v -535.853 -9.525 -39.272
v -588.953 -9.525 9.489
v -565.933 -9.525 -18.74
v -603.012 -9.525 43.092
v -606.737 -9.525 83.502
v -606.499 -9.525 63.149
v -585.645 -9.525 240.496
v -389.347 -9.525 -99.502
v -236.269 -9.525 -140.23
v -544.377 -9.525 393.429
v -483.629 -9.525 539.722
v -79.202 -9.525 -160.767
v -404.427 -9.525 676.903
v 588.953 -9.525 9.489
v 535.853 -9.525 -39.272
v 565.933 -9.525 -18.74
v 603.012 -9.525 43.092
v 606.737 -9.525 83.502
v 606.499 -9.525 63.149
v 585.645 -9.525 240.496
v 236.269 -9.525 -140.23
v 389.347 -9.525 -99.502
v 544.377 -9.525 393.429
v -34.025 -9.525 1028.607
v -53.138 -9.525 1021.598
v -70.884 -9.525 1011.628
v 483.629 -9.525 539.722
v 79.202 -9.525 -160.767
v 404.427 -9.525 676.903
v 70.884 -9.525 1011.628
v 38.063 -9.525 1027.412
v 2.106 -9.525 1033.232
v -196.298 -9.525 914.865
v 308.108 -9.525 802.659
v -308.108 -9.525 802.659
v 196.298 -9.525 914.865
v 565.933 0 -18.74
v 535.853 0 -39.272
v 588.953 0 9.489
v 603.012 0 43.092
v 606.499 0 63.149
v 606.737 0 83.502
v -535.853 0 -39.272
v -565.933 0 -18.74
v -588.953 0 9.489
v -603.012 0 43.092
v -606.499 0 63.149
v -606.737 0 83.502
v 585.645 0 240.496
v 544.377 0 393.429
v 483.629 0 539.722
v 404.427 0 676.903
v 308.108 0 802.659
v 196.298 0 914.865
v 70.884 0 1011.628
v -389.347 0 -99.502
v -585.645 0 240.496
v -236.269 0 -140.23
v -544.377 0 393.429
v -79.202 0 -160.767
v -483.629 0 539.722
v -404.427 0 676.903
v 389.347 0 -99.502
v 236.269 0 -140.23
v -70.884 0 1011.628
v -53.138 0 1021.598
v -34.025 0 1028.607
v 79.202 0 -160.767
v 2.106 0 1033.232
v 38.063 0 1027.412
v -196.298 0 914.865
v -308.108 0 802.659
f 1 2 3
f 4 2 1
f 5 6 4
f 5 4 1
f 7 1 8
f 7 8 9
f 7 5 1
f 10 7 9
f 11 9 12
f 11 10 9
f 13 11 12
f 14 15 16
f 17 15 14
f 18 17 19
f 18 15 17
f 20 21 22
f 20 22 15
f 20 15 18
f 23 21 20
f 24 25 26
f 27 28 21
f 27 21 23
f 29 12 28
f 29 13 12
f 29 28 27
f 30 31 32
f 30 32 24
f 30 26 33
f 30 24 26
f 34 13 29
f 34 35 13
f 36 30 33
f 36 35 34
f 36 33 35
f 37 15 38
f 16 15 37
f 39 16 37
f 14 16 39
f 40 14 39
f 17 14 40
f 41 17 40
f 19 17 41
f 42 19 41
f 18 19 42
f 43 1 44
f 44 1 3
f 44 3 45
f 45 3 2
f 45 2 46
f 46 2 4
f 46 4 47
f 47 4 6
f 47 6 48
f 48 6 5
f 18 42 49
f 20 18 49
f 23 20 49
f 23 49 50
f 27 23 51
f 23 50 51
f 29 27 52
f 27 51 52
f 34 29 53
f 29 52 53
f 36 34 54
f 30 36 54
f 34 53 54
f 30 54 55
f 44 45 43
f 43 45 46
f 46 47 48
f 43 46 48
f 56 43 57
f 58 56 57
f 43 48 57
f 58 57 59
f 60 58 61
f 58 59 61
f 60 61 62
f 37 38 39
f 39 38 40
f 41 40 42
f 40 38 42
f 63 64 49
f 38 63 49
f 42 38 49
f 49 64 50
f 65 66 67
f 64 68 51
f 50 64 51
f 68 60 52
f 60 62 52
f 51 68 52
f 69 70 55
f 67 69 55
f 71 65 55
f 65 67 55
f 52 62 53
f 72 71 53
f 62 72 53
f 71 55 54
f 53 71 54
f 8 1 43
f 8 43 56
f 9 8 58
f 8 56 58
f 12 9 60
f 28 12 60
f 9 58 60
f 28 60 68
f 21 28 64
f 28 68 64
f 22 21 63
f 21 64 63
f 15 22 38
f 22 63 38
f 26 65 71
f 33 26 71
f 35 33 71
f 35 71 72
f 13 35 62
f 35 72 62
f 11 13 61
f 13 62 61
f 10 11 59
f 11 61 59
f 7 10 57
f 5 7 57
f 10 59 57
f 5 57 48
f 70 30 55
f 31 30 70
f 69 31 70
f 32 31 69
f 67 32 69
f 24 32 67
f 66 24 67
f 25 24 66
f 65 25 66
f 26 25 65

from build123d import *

# Parameters (mm, degrees)
F1_DEPTH = 9.525
F2_R     = 127


with BuildPart() as f1:
    # F0 (on Front) → F1 (new body)
    with BuildSketch(Plane.XZ):
        with BuildLine():
            ThreePointArc((-609.6, 0), (0, -163.341827706), (609.6, 0))
            ThreePointArc((609.6, 0), (446.258172294, 609.6), (0, 1055.858172294))
            ThreePointArc((0, 1055.858172294), (-446.258172294, 609.6), (-609.6, 0))
        make_face()
    extrude(amount=F1_DEPTH)

    # F2
    f2_edges = [f1.edges().sort_by_distance(p)[0] for p in [
        (0, -4.7625, 1055.858172),
        (-609.6, -4.7625, 0),
        (609.6, -4.7625, 0),
    ]]
    fillet(f2_edges, radius=F2_R)


solid = f1.part
